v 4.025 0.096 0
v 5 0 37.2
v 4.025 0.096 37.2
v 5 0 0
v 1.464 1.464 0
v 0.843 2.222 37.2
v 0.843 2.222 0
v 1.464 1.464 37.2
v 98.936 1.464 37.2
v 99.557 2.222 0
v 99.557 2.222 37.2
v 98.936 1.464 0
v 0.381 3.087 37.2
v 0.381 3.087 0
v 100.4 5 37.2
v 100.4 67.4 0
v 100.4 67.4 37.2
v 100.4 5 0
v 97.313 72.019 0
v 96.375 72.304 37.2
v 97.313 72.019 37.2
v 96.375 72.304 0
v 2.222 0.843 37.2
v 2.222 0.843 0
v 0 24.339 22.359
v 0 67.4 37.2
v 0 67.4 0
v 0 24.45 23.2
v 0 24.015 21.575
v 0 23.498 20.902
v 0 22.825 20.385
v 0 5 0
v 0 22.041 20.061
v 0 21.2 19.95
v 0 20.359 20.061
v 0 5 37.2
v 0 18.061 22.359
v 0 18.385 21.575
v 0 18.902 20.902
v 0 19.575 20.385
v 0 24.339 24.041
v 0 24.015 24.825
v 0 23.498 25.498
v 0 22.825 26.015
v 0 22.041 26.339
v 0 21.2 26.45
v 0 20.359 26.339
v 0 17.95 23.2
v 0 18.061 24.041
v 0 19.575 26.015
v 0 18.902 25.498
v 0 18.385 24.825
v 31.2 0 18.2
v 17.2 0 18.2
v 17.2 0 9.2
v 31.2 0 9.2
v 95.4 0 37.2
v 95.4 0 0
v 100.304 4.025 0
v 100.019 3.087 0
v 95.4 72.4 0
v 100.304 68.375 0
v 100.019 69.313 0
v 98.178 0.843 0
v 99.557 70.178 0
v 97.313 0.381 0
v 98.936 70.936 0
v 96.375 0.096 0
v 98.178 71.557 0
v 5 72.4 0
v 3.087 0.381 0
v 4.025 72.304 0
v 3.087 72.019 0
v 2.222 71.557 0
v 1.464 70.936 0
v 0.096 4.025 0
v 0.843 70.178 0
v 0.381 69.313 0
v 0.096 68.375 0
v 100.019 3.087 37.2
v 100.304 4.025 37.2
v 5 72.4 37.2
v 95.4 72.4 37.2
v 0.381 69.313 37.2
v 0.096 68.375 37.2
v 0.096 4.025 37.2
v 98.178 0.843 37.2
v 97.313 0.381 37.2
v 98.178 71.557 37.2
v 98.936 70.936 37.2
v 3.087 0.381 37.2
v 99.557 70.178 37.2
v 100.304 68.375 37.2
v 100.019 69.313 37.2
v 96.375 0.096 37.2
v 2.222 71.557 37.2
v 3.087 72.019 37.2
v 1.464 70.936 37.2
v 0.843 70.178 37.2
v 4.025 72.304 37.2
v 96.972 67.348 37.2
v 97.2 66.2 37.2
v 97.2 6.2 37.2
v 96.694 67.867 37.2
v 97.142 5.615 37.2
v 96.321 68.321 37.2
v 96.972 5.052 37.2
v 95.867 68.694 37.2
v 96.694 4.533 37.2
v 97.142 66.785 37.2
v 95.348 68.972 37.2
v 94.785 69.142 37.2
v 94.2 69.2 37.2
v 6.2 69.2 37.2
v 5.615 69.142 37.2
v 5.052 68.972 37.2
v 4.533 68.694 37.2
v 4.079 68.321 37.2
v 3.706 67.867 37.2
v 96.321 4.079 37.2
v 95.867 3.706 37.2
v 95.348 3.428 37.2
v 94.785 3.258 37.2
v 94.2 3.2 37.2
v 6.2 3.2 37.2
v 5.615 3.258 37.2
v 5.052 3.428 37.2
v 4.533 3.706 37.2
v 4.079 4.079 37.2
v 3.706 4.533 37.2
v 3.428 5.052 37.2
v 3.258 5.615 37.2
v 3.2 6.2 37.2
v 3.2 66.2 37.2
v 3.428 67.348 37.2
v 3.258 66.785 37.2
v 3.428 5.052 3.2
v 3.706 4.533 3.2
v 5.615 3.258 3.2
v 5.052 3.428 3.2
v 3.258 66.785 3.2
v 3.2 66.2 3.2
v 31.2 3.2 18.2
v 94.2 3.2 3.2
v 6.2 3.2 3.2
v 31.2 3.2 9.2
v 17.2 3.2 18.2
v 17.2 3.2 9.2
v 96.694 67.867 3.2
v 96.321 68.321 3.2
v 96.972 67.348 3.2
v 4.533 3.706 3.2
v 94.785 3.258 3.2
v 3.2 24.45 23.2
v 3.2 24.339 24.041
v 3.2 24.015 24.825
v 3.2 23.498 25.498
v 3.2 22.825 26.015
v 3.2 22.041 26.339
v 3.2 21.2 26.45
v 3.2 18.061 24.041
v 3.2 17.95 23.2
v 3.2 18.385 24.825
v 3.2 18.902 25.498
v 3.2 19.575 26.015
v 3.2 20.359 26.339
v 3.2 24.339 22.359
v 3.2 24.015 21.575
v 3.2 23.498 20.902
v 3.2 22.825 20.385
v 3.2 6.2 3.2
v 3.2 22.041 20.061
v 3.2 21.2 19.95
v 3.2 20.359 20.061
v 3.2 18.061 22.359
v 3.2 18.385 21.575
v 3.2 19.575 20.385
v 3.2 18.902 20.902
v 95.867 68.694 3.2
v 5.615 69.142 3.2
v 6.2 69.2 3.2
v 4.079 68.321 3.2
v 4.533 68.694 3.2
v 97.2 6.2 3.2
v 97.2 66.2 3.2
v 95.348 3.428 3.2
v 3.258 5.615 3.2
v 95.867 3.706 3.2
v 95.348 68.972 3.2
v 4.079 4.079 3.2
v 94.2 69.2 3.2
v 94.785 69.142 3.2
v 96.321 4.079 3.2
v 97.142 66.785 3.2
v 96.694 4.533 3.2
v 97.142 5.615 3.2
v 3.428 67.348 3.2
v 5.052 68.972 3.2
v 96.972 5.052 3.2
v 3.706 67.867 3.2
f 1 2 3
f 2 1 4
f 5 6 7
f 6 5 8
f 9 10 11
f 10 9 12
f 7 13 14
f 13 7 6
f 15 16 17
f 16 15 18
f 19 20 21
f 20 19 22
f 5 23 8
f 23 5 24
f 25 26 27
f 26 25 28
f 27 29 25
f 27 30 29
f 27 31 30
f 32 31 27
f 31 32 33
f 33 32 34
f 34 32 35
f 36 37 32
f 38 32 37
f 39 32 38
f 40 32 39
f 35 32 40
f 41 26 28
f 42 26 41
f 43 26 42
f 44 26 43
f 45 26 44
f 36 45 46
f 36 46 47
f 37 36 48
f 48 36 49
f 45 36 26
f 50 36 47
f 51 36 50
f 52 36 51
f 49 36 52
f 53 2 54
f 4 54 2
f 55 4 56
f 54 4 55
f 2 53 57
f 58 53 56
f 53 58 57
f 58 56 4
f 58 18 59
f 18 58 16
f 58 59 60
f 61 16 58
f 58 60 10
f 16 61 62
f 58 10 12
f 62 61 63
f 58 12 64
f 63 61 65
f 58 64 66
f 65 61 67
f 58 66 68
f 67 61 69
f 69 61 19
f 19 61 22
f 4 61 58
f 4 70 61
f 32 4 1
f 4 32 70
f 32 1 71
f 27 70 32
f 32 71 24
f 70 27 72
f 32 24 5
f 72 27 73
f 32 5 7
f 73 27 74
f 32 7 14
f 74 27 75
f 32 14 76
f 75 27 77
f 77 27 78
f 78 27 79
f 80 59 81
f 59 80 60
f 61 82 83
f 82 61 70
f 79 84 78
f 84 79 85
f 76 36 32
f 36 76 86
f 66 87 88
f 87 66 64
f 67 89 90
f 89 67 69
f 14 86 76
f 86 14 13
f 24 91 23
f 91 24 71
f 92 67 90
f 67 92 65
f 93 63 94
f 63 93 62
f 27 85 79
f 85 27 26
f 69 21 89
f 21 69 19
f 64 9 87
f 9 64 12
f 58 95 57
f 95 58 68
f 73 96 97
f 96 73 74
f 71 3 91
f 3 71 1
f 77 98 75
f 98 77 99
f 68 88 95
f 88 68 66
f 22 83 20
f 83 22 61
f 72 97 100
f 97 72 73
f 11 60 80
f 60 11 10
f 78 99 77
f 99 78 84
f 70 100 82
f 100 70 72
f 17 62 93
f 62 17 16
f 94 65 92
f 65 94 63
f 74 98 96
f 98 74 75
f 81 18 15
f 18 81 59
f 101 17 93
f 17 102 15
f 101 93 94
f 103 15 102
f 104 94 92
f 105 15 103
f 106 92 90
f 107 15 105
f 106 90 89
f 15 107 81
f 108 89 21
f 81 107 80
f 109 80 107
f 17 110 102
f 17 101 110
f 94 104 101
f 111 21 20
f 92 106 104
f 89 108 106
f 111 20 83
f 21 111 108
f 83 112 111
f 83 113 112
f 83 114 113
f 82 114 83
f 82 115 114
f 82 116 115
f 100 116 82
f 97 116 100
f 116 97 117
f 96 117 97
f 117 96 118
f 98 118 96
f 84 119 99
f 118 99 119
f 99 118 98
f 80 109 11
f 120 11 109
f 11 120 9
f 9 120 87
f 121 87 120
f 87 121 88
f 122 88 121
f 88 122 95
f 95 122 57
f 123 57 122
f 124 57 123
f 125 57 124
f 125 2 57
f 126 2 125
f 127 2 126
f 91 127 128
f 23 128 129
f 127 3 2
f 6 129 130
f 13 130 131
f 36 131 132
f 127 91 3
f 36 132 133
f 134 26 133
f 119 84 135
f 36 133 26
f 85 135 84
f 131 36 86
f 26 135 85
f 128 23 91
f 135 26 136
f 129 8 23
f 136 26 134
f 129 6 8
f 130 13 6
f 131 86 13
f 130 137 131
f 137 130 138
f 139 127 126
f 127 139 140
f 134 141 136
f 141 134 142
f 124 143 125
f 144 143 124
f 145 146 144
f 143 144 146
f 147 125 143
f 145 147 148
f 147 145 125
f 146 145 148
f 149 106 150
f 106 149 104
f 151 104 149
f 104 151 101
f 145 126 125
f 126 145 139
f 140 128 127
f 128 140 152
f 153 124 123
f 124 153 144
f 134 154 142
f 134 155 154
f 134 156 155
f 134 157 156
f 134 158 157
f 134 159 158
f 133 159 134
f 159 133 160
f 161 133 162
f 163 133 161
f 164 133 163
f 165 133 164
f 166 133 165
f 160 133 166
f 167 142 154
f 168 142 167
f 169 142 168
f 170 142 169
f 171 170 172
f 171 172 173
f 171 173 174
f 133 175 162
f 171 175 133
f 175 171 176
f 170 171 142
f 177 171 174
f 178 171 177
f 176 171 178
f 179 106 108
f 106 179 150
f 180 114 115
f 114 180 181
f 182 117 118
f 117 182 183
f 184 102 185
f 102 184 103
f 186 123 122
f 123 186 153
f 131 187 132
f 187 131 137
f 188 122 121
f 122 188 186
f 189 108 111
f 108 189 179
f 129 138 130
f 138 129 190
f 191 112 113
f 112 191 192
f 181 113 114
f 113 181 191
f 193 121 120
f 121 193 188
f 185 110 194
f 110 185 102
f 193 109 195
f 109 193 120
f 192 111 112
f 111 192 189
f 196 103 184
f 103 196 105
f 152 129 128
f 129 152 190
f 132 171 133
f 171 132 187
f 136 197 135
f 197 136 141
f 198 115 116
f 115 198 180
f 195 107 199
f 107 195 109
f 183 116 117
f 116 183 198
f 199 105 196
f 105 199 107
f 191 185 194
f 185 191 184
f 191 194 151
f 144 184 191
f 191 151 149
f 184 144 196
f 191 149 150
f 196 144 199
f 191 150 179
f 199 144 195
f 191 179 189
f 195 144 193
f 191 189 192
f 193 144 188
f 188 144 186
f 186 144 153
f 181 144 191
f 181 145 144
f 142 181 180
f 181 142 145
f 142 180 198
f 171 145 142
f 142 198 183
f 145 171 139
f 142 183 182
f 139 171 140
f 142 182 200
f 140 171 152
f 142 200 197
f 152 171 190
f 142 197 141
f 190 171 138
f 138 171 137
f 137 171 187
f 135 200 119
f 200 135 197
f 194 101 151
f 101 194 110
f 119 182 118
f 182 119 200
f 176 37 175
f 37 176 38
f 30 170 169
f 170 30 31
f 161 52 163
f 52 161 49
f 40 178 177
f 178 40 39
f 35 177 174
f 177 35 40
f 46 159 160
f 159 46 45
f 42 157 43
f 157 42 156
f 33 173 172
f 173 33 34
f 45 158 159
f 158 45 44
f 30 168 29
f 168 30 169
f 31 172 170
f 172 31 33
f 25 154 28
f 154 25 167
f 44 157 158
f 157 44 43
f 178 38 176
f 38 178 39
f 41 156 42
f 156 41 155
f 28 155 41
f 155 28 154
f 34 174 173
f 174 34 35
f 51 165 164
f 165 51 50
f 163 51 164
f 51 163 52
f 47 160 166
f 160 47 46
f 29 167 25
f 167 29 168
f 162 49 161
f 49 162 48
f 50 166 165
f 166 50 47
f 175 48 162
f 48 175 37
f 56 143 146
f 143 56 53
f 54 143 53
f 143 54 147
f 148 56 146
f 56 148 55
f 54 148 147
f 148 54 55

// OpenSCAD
// Resetting World - Raspberry Pi 5 + LoRa Survival Beacon Case
// Parametric OpenSCAD Chassis (CERN-OHL-P v2)
// Recommended material: PETG or ASA (outdoor UV & heat resistance), 40% gyroid infill

wall = 3.2;
inner_w = 94.0;
inner_d = 66.0;
inner_h = 34.0; // Clearance for M.2 NVMe HAT + passive armor heatsink

module rounded_box(w, d, h, r=4) {
    hull() {
        for (x=[r, w-r], y=[r, d-r]) {
            translate([x, y, 0]) cylinder(h=h, r=r, $fn=32);
        }
    }
}

difference() {
    rounded_box(inner_w + 2*wall, inner_d + 2*wall, inner_h + wall, r=5);
    translate([wall, wall, wall])
        rounded_box(inner_w, inner_d, inner_h + 1, r=3);
    // SMA LoRa antenna bulkhead hole (6.5mm)
    translate([-1, wall + 18, wall + 20])
        rotate([0, 90, 0]) cylinder(h=wall + 4, d=6.5, $fn=24);
    // USB-C PD 5V power grommet cutout
    translate([wall + 14, -1, wall + 6])
        cube([14, wall + 4, 9]);
}
